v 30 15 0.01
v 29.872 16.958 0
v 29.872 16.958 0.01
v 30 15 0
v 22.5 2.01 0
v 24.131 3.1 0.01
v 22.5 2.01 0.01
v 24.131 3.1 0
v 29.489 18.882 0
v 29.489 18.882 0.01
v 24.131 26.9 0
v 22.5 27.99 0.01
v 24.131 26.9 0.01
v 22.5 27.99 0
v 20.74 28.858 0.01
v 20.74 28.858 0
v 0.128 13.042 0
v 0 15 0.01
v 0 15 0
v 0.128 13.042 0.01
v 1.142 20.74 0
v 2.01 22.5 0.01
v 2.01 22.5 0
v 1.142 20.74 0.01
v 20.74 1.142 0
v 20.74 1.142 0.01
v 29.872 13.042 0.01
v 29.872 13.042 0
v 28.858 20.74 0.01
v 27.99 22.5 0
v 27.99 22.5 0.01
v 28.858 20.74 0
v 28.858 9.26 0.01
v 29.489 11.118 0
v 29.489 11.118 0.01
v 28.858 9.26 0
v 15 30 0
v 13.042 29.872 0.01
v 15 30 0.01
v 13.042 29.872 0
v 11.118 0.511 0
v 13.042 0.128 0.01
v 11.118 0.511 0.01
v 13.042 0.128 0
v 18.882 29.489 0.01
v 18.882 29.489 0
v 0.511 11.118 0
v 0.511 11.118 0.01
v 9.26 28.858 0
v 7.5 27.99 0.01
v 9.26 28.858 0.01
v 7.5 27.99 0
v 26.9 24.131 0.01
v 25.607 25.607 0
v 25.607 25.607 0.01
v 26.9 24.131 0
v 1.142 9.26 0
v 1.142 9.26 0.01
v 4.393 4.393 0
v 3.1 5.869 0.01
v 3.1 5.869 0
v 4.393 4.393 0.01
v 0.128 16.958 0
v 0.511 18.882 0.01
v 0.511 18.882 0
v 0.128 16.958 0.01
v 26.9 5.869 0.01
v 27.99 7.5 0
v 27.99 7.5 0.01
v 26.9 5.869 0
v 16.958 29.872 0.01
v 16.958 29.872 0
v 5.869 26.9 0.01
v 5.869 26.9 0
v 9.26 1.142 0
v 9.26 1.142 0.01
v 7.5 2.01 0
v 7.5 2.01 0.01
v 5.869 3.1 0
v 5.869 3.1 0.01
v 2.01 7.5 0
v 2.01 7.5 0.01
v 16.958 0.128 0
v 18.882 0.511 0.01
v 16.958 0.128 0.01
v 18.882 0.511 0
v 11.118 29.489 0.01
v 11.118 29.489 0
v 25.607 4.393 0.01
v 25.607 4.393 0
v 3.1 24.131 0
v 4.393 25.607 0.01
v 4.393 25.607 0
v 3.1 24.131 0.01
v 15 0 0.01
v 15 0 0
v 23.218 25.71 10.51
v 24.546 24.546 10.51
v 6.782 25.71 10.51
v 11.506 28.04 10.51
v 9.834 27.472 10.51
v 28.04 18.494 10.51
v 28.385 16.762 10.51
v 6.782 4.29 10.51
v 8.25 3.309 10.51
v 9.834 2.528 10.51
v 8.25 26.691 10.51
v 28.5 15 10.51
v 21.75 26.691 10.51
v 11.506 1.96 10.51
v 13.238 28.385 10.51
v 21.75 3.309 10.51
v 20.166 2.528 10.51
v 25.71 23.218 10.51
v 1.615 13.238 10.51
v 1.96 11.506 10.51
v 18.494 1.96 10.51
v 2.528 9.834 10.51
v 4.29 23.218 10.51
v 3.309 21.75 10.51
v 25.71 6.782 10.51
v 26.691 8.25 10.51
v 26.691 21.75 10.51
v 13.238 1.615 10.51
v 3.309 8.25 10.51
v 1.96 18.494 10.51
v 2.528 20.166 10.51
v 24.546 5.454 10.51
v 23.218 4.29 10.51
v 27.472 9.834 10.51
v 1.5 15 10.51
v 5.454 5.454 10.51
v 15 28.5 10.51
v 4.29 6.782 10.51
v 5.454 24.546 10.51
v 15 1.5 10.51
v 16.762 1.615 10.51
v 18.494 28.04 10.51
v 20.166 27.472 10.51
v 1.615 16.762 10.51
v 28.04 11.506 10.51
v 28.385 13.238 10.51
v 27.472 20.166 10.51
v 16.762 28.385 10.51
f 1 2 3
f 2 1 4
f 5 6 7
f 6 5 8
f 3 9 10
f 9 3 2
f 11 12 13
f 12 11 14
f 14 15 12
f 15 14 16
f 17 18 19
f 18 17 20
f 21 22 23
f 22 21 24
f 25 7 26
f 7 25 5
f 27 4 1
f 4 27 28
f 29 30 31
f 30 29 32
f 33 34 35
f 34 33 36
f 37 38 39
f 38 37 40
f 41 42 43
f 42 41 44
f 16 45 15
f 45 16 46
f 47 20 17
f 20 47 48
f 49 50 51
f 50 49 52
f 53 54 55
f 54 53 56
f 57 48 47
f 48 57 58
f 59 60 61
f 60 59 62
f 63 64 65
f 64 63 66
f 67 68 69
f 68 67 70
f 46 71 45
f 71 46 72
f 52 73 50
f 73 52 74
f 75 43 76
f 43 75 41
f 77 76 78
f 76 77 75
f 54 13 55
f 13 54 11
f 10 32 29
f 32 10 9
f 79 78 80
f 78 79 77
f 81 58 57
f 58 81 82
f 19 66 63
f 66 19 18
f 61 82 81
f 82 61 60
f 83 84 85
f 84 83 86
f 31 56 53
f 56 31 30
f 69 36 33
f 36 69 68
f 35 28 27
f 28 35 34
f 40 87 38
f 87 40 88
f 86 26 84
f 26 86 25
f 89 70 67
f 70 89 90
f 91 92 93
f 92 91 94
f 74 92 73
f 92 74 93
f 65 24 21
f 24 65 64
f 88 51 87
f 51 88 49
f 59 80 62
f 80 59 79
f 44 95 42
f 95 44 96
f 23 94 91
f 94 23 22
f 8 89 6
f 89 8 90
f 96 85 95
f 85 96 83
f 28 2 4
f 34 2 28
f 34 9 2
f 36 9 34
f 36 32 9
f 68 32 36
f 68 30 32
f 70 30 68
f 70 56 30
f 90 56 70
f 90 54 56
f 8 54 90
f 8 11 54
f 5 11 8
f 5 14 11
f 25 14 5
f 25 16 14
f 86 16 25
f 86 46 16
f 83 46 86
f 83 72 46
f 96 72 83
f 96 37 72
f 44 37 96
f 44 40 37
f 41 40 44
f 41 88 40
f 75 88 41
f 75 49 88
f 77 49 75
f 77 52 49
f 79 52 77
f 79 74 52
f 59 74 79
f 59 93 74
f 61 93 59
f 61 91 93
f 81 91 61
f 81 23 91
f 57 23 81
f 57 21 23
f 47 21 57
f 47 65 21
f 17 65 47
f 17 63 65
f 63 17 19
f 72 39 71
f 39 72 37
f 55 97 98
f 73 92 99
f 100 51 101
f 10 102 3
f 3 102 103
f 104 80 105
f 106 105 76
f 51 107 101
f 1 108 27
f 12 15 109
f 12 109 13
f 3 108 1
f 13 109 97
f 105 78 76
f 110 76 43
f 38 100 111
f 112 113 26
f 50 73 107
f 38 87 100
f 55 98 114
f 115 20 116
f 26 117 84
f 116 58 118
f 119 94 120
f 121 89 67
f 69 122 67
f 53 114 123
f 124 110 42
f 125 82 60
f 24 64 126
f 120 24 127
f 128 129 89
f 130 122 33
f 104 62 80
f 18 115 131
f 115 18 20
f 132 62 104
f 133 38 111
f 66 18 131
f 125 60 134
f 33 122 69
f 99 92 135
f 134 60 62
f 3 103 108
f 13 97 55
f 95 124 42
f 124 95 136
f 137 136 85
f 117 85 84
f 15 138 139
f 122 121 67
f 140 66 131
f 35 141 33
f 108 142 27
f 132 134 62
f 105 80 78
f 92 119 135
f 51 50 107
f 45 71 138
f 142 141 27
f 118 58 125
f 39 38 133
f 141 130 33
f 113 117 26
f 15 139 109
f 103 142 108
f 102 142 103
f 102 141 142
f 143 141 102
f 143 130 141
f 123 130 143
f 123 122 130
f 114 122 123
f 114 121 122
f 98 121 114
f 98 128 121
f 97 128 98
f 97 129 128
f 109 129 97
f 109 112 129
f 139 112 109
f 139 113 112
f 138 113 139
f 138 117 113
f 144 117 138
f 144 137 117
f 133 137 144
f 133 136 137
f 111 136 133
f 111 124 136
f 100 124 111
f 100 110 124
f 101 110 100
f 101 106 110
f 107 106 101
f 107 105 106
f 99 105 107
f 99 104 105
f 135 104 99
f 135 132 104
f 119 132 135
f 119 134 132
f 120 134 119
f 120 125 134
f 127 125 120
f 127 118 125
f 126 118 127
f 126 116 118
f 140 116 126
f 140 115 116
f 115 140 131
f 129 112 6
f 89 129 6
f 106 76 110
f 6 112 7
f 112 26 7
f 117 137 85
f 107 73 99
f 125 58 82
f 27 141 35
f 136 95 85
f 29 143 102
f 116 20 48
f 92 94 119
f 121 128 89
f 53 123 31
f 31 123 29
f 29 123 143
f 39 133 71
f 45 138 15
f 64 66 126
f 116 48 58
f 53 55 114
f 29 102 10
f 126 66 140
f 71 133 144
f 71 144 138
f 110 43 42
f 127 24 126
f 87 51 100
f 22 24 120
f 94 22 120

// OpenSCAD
// units=mm — generated by scad_emitter.py
// part=unnamed
$fn = 48;

intersection() { translate([15, 15, 0]) cylinder(h=12, r=15, $fn=$fn); hull() { translate([15,15,0]) cylinder(h=0.01,r=15,$fn=$fn); translate([15,15,10.5]) cylinder(h=0.01,r=13.5,$fn=$fn); } }
